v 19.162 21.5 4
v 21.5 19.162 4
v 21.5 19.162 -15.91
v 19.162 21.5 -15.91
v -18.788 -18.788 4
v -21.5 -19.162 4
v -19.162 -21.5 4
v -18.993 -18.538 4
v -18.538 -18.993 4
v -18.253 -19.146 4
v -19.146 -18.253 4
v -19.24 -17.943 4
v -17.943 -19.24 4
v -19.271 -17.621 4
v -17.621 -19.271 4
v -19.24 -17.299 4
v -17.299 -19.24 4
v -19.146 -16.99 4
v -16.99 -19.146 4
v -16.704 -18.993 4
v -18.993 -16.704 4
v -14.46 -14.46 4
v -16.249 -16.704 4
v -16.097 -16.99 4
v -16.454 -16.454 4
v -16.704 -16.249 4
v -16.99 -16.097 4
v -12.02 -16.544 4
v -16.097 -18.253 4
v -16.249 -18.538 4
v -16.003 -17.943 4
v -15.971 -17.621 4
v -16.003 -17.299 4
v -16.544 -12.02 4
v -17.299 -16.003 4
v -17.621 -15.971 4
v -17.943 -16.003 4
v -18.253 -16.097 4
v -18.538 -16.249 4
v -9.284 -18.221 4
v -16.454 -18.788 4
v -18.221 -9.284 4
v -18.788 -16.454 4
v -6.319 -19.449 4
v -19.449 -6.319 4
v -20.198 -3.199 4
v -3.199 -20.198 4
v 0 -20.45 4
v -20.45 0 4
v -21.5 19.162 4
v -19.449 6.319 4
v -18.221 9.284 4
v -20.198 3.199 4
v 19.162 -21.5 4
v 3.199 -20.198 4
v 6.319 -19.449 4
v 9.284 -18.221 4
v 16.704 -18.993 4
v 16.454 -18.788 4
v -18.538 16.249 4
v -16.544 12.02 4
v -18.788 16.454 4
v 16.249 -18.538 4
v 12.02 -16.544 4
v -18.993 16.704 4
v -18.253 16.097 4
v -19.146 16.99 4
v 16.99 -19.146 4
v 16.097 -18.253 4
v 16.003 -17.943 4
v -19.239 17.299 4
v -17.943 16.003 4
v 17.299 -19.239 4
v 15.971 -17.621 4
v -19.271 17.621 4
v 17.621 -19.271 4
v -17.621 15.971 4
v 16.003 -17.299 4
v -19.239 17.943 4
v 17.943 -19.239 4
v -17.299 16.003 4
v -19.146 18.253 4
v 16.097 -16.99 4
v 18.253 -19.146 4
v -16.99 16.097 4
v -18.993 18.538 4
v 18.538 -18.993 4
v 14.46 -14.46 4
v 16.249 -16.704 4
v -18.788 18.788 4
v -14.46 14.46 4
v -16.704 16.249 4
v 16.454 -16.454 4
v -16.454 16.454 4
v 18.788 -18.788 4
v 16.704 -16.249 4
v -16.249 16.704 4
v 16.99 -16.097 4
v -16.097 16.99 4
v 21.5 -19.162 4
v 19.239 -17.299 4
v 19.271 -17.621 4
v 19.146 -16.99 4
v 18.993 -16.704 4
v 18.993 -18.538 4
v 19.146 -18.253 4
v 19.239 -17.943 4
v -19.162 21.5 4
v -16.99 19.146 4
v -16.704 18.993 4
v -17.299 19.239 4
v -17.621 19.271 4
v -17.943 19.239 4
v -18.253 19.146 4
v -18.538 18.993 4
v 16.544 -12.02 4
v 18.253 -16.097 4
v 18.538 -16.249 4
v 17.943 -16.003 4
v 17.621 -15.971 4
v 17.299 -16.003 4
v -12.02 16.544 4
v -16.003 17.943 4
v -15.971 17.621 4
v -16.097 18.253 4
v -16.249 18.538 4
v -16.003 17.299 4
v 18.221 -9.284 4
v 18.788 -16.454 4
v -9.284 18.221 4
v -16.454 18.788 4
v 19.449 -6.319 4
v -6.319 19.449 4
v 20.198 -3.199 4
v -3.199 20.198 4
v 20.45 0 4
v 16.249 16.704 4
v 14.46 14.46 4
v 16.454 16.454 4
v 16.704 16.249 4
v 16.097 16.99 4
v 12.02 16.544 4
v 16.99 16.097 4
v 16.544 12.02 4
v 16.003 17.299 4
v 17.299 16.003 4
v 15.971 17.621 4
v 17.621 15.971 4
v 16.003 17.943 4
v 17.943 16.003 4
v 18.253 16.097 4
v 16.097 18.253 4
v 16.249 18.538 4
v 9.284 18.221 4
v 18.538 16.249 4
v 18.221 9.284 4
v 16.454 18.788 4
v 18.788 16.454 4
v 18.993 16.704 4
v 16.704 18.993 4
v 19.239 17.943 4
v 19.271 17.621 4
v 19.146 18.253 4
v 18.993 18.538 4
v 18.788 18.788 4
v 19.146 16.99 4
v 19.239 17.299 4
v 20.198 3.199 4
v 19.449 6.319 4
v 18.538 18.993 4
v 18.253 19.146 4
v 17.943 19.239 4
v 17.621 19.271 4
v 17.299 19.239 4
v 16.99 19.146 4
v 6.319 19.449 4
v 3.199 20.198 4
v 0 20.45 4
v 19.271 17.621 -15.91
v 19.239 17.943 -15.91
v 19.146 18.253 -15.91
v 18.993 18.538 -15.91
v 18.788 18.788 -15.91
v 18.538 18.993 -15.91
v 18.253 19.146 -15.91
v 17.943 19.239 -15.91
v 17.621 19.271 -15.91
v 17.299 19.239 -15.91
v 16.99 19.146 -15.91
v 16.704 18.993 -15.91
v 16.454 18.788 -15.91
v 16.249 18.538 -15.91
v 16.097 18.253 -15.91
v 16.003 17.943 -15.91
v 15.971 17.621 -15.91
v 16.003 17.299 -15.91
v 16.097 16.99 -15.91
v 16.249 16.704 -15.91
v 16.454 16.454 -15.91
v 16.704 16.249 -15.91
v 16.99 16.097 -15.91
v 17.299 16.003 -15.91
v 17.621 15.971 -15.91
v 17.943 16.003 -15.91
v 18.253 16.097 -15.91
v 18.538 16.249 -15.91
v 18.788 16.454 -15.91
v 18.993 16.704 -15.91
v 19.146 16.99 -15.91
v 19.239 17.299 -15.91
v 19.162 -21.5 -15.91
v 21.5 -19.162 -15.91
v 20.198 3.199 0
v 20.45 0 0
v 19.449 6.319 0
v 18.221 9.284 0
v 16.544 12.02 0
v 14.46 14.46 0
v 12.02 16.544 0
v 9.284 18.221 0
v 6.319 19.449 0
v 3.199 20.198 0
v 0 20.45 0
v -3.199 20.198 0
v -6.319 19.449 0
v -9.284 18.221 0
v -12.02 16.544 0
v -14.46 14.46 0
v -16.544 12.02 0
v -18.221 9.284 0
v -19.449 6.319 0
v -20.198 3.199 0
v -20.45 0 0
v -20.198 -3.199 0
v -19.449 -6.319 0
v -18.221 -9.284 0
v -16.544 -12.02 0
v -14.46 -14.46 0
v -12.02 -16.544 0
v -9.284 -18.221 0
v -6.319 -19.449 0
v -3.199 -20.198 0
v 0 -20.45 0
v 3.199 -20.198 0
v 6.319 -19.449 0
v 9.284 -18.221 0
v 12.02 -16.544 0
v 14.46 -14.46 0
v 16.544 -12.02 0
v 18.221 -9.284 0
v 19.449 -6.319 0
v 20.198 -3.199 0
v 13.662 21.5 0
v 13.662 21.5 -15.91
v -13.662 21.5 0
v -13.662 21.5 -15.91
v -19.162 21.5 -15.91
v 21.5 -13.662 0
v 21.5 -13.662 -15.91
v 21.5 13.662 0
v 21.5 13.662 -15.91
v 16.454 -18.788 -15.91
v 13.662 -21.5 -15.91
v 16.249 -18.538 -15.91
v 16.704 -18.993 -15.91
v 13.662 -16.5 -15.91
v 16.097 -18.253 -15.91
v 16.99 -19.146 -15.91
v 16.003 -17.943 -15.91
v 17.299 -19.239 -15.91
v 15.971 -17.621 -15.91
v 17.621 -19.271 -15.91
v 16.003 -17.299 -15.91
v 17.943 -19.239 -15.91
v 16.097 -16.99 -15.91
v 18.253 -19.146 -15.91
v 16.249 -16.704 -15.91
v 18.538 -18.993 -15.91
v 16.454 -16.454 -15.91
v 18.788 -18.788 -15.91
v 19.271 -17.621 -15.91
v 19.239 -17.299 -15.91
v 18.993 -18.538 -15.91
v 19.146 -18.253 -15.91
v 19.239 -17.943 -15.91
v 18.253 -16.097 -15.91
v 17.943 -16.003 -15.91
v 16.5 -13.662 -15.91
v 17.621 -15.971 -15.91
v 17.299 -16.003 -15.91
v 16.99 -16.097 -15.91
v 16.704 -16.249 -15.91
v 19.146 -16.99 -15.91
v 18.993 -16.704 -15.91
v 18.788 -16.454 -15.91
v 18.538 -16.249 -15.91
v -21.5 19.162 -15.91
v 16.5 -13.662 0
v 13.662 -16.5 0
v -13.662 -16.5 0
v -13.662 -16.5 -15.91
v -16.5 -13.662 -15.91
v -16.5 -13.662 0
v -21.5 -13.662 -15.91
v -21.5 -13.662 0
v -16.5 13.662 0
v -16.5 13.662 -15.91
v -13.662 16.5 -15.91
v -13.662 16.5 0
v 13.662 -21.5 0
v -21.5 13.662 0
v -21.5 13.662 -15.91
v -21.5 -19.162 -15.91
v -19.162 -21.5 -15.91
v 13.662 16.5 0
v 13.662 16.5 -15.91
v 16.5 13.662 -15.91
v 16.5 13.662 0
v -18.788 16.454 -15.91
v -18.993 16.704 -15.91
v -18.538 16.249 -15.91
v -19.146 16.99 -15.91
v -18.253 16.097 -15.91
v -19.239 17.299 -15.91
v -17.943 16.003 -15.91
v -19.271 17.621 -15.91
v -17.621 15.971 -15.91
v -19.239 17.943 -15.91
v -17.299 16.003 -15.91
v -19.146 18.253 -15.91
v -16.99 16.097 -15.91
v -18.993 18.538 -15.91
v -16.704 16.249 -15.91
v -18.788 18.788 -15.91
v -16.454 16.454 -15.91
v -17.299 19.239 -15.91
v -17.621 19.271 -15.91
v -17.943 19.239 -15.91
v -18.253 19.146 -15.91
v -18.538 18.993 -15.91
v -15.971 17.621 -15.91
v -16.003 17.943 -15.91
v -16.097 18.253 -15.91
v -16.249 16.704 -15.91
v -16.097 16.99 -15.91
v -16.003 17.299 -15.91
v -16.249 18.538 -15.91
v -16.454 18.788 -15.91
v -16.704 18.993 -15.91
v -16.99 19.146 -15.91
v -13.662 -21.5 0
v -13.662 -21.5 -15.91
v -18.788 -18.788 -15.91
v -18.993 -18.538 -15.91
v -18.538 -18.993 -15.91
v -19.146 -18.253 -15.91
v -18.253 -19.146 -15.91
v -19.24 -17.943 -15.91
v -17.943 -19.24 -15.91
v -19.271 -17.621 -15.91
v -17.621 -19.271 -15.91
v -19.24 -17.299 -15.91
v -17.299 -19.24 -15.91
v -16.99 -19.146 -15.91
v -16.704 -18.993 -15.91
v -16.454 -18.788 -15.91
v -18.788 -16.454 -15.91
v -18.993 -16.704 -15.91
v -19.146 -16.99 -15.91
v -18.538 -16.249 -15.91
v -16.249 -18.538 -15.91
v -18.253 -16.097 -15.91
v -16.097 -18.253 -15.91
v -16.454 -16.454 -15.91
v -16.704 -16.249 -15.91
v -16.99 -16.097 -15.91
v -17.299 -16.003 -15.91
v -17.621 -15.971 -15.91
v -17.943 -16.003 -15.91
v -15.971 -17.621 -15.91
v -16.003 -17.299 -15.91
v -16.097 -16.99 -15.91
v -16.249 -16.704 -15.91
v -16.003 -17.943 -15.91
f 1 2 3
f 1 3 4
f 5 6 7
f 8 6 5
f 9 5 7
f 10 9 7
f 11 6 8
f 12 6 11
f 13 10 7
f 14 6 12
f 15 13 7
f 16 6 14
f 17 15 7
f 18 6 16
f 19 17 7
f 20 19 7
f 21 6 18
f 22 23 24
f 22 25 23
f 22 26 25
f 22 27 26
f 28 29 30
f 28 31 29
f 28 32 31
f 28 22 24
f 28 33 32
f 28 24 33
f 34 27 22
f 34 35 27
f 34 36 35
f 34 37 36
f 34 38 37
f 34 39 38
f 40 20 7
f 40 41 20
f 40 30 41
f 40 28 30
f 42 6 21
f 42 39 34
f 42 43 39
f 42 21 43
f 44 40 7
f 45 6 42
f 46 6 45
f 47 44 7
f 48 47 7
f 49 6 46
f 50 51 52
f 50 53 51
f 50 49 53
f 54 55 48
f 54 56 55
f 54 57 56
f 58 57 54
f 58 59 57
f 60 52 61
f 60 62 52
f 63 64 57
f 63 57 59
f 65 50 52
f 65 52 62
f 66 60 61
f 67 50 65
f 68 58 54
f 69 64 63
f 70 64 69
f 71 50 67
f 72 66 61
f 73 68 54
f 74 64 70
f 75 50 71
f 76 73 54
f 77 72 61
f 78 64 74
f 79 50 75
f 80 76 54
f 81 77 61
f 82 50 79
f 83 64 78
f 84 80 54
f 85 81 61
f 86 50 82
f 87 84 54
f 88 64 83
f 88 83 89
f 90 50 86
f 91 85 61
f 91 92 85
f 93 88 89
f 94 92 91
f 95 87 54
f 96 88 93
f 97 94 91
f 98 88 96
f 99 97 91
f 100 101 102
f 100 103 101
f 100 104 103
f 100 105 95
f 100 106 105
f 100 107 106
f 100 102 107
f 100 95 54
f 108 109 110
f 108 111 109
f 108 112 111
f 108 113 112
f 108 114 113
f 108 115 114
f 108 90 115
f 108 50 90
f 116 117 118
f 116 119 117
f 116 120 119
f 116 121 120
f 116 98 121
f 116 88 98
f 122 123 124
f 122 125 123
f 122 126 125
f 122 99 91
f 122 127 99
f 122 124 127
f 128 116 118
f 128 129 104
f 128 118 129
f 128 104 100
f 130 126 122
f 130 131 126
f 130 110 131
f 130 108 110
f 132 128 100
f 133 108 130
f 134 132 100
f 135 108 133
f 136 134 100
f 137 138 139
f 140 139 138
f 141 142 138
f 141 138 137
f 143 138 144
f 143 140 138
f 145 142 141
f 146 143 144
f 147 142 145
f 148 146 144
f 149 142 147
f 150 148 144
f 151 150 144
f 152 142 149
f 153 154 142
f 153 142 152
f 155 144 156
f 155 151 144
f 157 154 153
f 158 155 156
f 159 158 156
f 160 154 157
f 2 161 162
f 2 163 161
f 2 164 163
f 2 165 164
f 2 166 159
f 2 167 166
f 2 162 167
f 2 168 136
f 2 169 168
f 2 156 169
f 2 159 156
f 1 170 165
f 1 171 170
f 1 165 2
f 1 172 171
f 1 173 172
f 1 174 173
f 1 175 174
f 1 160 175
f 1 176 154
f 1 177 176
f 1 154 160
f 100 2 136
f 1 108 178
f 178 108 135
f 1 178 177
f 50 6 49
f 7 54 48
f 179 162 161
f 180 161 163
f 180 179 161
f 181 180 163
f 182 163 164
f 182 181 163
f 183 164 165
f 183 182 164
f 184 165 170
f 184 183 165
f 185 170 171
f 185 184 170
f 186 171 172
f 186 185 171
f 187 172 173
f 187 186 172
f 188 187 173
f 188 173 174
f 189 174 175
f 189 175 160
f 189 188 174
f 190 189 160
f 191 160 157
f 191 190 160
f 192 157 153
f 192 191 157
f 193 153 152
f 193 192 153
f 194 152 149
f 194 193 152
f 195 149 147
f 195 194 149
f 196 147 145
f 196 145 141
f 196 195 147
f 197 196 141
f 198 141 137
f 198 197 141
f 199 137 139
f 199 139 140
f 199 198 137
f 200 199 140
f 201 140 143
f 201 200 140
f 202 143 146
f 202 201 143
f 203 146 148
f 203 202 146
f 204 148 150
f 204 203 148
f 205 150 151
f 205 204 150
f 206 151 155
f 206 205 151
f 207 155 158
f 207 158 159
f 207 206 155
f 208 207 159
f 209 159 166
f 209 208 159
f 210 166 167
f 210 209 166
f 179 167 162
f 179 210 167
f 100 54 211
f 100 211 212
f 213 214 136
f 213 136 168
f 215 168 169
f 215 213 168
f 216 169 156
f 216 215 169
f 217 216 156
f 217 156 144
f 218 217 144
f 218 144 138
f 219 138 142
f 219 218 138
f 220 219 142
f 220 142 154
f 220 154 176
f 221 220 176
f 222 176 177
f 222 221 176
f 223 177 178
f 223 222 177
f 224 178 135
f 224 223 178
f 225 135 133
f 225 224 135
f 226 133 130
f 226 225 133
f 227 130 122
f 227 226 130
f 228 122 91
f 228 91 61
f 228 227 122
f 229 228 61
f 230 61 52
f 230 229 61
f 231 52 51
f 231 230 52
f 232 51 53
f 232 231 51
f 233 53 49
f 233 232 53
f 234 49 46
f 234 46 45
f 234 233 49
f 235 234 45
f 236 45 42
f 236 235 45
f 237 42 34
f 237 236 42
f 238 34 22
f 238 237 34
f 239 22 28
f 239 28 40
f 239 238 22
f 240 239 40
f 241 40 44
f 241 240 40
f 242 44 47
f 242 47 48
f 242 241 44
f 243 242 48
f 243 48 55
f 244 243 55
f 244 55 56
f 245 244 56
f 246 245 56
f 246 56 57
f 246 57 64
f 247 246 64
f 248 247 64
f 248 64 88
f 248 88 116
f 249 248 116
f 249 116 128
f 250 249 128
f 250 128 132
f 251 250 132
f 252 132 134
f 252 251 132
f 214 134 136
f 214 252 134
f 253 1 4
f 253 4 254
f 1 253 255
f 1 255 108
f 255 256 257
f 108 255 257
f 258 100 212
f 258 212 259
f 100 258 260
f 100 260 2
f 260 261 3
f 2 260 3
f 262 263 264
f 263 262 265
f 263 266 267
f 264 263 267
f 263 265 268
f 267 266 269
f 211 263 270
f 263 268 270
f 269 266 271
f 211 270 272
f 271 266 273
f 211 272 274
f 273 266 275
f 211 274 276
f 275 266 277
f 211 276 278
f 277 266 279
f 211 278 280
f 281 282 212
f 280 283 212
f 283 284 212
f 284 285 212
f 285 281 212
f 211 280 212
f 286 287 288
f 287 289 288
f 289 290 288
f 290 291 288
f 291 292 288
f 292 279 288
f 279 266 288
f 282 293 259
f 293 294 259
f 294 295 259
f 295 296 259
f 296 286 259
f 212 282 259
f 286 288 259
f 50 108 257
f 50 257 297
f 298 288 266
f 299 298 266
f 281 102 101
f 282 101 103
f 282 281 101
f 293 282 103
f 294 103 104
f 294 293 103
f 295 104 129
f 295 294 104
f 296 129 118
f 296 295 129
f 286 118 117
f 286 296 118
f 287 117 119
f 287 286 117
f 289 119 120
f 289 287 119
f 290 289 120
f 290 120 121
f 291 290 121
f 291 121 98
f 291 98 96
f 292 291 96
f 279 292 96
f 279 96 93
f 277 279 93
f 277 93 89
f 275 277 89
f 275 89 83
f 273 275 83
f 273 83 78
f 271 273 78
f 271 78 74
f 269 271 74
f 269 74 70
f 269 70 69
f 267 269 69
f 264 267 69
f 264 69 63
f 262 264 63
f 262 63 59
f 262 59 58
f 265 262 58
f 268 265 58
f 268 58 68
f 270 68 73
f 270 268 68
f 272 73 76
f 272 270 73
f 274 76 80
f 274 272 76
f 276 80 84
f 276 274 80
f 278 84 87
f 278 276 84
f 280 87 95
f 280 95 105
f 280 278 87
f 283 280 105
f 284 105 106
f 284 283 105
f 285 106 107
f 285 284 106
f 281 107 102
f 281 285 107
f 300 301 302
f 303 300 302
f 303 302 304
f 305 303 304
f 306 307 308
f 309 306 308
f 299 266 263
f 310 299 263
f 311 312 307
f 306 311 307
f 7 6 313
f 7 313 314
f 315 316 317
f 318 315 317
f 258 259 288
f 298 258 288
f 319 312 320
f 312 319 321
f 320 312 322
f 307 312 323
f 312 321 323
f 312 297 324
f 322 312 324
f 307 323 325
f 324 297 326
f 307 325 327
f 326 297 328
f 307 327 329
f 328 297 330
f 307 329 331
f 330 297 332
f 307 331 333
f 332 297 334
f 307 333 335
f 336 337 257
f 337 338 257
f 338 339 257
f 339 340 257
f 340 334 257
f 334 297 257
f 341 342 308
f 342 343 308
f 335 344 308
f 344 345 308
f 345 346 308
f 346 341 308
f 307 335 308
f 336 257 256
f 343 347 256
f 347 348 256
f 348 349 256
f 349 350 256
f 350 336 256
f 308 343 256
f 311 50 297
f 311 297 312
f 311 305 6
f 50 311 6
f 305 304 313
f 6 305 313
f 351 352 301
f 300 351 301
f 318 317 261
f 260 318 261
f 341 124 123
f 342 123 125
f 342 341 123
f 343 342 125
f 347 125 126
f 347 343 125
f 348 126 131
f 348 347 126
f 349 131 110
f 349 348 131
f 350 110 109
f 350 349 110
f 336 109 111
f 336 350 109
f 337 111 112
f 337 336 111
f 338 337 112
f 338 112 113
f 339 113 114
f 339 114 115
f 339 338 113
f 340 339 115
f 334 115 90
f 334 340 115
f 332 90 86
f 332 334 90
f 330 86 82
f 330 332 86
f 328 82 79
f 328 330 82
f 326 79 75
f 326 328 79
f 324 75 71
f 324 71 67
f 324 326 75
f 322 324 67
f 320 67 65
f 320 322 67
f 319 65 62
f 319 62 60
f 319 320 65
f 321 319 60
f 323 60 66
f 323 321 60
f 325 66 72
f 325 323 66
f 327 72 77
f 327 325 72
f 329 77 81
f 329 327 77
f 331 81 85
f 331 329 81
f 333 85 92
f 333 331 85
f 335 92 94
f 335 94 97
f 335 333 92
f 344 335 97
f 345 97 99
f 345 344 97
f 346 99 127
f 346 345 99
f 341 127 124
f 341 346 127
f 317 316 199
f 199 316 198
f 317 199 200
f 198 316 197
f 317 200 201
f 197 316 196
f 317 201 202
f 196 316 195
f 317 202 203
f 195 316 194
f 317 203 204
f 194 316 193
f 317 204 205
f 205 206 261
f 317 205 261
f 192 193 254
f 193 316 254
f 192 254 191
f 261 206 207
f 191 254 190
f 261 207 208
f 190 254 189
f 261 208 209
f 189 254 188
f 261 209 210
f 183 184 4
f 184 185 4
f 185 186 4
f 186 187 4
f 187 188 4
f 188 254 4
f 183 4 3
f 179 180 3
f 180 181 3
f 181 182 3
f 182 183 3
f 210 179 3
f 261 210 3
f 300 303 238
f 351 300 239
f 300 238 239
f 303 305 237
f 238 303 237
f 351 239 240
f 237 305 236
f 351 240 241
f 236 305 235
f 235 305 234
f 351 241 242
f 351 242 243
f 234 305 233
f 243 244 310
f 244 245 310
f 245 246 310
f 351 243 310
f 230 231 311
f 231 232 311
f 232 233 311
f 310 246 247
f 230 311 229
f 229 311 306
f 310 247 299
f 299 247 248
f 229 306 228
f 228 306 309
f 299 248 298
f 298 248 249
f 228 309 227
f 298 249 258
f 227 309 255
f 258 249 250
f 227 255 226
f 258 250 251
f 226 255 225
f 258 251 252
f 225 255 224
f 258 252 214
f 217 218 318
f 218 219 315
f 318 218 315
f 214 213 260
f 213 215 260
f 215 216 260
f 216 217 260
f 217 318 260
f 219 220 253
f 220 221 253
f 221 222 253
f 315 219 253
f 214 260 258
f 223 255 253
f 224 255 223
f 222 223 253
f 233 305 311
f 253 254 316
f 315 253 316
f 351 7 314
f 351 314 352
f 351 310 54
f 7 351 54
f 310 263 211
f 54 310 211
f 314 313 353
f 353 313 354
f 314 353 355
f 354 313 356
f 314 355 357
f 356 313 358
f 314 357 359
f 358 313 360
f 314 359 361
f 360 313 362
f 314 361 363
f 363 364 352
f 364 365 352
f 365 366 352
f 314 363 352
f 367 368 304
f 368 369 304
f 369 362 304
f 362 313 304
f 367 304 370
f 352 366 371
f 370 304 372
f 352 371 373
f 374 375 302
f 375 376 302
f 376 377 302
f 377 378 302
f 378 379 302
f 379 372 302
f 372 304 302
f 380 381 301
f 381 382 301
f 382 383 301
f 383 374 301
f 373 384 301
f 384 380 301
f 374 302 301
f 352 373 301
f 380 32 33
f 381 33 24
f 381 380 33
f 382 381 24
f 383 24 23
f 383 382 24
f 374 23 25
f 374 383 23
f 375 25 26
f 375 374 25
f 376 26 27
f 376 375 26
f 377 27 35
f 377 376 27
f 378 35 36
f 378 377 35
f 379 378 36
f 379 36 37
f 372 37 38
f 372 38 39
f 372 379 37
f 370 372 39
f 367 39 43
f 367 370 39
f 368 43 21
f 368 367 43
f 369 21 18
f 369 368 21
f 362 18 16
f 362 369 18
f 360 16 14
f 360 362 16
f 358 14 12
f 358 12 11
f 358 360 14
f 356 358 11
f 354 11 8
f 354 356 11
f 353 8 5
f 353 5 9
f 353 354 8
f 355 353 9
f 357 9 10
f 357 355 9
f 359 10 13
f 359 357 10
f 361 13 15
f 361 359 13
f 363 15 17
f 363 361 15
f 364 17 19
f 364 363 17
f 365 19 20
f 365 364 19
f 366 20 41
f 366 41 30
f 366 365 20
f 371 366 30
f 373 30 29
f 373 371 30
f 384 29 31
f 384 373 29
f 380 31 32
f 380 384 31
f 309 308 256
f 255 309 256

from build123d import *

# Parameters (mm, degrees)
SKETCH1_R           = 1.65
SKETCH1_R_2         = 20.45
SKETCH1_R_3         = 1.650080795
BOSS_EXTRUDE1_DEPTH = 4
BOSS_EXTRUDE2_START = -15.91
SKETCH1_4_R         = 1.65
SKETCH1_4_R_2       = 1.650080795
BOSS_EXTRUDE2_DEPTH = 15.91


with BuildPart() as part:
    # Sketch1 → Boss-Extrude1 (new body)
    with BuildSketch(Plane.XY):
        Polygon((19.162202379, -21.5), (21.5, -19.162202379), (21.5, 19.162202379), (19.162202379, 21.5), (-19.162202379, 21.5), (-21.5, 19.162202379), (-21.5, -19.162202379), (-19.162202379, -21.5), align=None)
        with Locations((17.621156877, -17.621156877)):
            Circle(SKETCH1_R, mode=Mode.SUBTRACT)
        Circle(SKETCH1_R_2, mode=Mode.SUBTRACT)
        with Locations((-17.621156877, -17.621156877)):
            Circle(SKETCH1_R_3, mode=Mode.SUBTRACT)
        with Locations((-17.621156877, 17.621156877)):
            Circle(SKETCH1_R, mode=Mode.SUBTRACT)
        with Locations((17.621156877, 17.621156877)):
            Circle(SKETCH1_R, mode=Mode.SUBTRACT)
    extrude(amount=BOSS_EXTRUDE1_DEPTH)

    # Sketch1<4> → Boss-Extrude2 (add)
    # profile 1 of 4: a face of its own
    with BuildSketch(Plane.XY.offset(BOSS_EXTRUDE2_START)):
        Polygon((13.662202379, -21.5), (19.162202379, -21.5), (21.5, -19.162202379), (21.5, -13.662202379), (16.5, -13.662202379), (13.662202379, -16.5), align=None)
        with Locations((17.621156877, -17.621156877)):
            Circle(SKETCH1_4_R, mode=Mode.SUBTRACT)
    # profile 2 of 4: a face of its own
    with BuildSketch(Plane.XY.offset(BOSS_EXTRUDE2_START)):
        Polygon((-19.162202379, -21.5), (-13.662202379, -21.5), (-13.662202379, -16.5), (-16.5, -13.662202379), (-21.5, -13.662202379), (-21.5, -19.162202379), align=None)
        with Locations((-17.621156877, -17.621156877)):
            Circle(SKETCH1_4_R_2, mode=Mode.SUBTRACT)
    # profile 3 of 4: a face of its own
    with BuildSketch(Plane.XY.offset(BOSS_EXTRUDE2_START)):
        Polygon((16.5, 13.662202379), (21.5, 13.662202379), (21.5, 19.162202379), (19.162202379, 21.5), (13.662202379, 21.5), (13.662202379, 16.5), align=None)
        with Locations((17.621156877, 17.621156877)):
            Circle(SKETCH1_4_R, mode=Mode.SUBTRACT)
    # profile 4 of 4: a face of its own
    with BuildSketch(Plane.XY.offset(BOSS_EXTRUDE2_START)):
        Polygon((-21.5, 19.162202379), (-21.5, 13.662202379), (-16.5, 13.662202379), (-13.662202379, 16.5), (-13.662202379, 21.5), (-19.162202379, 21.5), align=None)
        with Locations((-17.621156877, 17.621156877)):
            Circle(SKETCH1_4_R, mode=Mode.SUBTRACT)
    extrude(amount=BOSS_EXTRUDE2_DEPTH)


solid = part.part
